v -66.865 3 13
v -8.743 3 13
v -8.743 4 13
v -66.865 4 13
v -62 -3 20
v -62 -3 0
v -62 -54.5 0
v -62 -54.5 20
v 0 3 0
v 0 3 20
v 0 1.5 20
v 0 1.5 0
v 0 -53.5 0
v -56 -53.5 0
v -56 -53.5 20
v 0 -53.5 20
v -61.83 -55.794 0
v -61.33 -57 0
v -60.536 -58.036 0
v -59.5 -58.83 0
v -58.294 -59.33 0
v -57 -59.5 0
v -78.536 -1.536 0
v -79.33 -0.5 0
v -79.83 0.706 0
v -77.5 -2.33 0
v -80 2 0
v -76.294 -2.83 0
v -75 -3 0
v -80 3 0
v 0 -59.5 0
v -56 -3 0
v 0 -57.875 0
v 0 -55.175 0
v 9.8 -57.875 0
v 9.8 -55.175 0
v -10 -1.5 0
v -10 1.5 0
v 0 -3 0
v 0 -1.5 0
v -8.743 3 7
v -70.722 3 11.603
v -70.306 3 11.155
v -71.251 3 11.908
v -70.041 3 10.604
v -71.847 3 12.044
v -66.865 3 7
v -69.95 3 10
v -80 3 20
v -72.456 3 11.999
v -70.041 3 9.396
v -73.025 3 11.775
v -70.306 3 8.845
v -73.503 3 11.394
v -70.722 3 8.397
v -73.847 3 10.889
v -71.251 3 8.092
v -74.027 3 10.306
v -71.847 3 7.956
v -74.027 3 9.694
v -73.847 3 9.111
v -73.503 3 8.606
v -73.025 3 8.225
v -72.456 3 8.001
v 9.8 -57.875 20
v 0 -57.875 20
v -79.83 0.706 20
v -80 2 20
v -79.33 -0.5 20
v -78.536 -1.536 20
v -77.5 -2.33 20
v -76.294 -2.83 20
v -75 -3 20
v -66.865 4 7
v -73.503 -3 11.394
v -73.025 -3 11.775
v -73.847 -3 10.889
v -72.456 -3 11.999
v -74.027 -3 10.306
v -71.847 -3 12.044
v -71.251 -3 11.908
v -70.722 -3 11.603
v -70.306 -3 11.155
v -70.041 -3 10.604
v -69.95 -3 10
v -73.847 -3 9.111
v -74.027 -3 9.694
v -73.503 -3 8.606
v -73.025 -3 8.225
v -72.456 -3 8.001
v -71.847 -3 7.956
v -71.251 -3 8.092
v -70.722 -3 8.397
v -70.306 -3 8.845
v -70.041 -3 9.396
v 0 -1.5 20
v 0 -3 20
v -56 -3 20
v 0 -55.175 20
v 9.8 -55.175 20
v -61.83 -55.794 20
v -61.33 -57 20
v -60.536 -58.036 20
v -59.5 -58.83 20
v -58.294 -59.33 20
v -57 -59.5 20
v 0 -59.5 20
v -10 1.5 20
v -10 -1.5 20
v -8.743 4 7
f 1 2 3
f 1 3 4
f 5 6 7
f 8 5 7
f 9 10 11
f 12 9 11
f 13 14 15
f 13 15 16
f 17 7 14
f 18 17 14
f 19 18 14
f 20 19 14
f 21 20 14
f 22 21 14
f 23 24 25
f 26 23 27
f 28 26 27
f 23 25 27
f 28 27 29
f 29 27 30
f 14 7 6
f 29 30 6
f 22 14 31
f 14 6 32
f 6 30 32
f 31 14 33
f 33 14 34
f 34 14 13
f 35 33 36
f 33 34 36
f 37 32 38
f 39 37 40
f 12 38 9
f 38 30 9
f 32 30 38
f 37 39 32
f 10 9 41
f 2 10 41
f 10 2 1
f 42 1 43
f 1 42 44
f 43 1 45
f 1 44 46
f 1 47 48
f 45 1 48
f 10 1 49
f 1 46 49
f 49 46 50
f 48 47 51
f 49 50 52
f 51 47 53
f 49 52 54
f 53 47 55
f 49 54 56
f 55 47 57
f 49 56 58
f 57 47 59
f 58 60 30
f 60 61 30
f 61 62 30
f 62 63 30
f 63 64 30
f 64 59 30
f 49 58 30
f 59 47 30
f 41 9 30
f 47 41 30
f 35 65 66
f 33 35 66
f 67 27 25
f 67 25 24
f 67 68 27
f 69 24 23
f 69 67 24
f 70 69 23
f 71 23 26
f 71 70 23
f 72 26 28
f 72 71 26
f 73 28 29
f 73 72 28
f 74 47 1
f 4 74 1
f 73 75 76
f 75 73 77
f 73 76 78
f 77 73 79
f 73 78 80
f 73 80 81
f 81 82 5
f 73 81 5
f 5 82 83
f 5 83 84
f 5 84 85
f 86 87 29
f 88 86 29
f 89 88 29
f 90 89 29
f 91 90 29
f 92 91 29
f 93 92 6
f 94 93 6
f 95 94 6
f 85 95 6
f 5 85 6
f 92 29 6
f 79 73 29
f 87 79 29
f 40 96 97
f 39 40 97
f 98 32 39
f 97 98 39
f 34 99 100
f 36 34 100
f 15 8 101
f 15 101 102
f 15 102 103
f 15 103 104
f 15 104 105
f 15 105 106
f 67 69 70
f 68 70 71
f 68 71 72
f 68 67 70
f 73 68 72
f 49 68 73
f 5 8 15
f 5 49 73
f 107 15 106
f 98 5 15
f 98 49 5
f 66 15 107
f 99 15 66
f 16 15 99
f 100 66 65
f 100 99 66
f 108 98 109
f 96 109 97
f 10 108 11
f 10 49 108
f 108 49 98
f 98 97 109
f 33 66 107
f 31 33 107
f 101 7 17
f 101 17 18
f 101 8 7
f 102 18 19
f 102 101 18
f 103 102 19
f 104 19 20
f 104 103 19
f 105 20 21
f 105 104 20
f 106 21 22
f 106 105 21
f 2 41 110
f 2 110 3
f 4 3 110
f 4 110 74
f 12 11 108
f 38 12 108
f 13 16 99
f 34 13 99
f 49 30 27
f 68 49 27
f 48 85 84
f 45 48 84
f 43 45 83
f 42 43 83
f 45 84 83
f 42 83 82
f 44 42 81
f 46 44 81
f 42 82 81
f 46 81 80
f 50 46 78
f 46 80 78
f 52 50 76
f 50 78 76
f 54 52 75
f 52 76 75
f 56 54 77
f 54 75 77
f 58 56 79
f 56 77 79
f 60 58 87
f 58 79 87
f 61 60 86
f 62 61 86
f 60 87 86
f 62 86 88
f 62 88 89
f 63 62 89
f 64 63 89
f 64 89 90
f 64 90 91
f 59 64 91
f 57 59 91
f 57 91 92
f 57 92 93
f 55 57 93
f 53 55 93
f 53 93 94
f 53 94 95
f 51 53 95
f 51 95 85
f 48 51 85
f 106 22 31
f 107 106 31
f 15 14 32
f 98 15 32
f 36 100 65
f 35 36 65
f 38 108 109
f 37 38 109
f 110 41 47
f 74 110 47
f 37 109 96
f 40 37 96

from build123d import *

# Parameters (mm, degrees)
F0_W     = 112
F0_H     = 50.5
F1_DEPTH = 20
F2_R     = 5
F4_D     = 4.1
F6_DEPTH = 20
F7_W     = 58.122847
F7_H     = 6
F8_DEPTH = 1


with BuildPart() as f1:
    # F0 (on Top) → F1 (new body)
    with BuildSketch(Plane.XY):
        Polygon((80, 3), (-80, 3), (-80, -3), (-62, -3), (-62, -59.5), (62, -59.5), (62, -3), (80, -3), align=None)
        with Locations((0, -28.25)):
            Rectangle(F0_W, F0_H, mode=Mode.SUBTRACT)
    extrude(amount=F1_DEPTH)

    # F2
    f2_edges = [f1.edges().sort_by_distance(p)[0] for p in [
        (62, -59.5, 10),
        (-62, -59.5, 10),
        (-80, -3, 10),
        (80, -3, 10),
    ]]
    fillet(f2_edges, radius=F2_R)

    # F4 (through all)
    with Locations(Plane(origin=(0, 3, 0), x_dir=(-1, 0, 0), z_dir=(0, 1, 0))):
        with Locations((-72, 10), (72, 10)):
            Hole(F4_D / 2)

    # F5 (on face) → F6 (cut, through all)
    with BuildSketch(Plane.XY.offset(20)):
        with BuildLine():
            Line((0, -55.17533), (9.8, -55.17533))
            Line((9.8, -55.17533), (9.8, -57.87533))
            Line((9.8, -57.87533), (0, -57.87533))
            Line((0, -57.87533), (0, -59.5))
            Line((0, -59.5), (57, -59.5))
            ThreePointArc((57, -59.5), (60.535534, -58.035534), (62, -54.5))
            Line((62, -54.5), (62, -3))
            Line((62, -3), (75, -3))
            ThreePointArc((75, -3), (78.535534, -1.535534), (80, 2))
            Line((80, 2), (80, 3))
            Line((80, 3), (0, 3))
            Line((0, 3), (0, 1.5))
            Line((0, 1.5), (-10, 1.5))
            Line((-10, 1.5), (-10, -1.5))
            Line((-10, -1.5), (0, -1.5))
            Line((0, -1.5), (0, -3))
            Line((0, -3), (56, -3))
            Line((56, -3), (56, -53.5))
            Line((56, -53.5), (0, -53.5))
            Line((0, -53.5), (0, -55.17533))
        make_face()
    extrude(amount=-F6_DEPTH, mode=Mode.SUBTRACT)

    # F7 (on face) → F8 (join)
    with BuildSketch(Plane(origin=(0, 3, 0), x_dir=(-1, 0, 0), z_dir=(0, 1, 0))):
        with Locations((37.804018, 10)):
            Rectangle(F7_W, F7_H)
    extrude(amount=F8_DEPTH)


solid = f1.part
